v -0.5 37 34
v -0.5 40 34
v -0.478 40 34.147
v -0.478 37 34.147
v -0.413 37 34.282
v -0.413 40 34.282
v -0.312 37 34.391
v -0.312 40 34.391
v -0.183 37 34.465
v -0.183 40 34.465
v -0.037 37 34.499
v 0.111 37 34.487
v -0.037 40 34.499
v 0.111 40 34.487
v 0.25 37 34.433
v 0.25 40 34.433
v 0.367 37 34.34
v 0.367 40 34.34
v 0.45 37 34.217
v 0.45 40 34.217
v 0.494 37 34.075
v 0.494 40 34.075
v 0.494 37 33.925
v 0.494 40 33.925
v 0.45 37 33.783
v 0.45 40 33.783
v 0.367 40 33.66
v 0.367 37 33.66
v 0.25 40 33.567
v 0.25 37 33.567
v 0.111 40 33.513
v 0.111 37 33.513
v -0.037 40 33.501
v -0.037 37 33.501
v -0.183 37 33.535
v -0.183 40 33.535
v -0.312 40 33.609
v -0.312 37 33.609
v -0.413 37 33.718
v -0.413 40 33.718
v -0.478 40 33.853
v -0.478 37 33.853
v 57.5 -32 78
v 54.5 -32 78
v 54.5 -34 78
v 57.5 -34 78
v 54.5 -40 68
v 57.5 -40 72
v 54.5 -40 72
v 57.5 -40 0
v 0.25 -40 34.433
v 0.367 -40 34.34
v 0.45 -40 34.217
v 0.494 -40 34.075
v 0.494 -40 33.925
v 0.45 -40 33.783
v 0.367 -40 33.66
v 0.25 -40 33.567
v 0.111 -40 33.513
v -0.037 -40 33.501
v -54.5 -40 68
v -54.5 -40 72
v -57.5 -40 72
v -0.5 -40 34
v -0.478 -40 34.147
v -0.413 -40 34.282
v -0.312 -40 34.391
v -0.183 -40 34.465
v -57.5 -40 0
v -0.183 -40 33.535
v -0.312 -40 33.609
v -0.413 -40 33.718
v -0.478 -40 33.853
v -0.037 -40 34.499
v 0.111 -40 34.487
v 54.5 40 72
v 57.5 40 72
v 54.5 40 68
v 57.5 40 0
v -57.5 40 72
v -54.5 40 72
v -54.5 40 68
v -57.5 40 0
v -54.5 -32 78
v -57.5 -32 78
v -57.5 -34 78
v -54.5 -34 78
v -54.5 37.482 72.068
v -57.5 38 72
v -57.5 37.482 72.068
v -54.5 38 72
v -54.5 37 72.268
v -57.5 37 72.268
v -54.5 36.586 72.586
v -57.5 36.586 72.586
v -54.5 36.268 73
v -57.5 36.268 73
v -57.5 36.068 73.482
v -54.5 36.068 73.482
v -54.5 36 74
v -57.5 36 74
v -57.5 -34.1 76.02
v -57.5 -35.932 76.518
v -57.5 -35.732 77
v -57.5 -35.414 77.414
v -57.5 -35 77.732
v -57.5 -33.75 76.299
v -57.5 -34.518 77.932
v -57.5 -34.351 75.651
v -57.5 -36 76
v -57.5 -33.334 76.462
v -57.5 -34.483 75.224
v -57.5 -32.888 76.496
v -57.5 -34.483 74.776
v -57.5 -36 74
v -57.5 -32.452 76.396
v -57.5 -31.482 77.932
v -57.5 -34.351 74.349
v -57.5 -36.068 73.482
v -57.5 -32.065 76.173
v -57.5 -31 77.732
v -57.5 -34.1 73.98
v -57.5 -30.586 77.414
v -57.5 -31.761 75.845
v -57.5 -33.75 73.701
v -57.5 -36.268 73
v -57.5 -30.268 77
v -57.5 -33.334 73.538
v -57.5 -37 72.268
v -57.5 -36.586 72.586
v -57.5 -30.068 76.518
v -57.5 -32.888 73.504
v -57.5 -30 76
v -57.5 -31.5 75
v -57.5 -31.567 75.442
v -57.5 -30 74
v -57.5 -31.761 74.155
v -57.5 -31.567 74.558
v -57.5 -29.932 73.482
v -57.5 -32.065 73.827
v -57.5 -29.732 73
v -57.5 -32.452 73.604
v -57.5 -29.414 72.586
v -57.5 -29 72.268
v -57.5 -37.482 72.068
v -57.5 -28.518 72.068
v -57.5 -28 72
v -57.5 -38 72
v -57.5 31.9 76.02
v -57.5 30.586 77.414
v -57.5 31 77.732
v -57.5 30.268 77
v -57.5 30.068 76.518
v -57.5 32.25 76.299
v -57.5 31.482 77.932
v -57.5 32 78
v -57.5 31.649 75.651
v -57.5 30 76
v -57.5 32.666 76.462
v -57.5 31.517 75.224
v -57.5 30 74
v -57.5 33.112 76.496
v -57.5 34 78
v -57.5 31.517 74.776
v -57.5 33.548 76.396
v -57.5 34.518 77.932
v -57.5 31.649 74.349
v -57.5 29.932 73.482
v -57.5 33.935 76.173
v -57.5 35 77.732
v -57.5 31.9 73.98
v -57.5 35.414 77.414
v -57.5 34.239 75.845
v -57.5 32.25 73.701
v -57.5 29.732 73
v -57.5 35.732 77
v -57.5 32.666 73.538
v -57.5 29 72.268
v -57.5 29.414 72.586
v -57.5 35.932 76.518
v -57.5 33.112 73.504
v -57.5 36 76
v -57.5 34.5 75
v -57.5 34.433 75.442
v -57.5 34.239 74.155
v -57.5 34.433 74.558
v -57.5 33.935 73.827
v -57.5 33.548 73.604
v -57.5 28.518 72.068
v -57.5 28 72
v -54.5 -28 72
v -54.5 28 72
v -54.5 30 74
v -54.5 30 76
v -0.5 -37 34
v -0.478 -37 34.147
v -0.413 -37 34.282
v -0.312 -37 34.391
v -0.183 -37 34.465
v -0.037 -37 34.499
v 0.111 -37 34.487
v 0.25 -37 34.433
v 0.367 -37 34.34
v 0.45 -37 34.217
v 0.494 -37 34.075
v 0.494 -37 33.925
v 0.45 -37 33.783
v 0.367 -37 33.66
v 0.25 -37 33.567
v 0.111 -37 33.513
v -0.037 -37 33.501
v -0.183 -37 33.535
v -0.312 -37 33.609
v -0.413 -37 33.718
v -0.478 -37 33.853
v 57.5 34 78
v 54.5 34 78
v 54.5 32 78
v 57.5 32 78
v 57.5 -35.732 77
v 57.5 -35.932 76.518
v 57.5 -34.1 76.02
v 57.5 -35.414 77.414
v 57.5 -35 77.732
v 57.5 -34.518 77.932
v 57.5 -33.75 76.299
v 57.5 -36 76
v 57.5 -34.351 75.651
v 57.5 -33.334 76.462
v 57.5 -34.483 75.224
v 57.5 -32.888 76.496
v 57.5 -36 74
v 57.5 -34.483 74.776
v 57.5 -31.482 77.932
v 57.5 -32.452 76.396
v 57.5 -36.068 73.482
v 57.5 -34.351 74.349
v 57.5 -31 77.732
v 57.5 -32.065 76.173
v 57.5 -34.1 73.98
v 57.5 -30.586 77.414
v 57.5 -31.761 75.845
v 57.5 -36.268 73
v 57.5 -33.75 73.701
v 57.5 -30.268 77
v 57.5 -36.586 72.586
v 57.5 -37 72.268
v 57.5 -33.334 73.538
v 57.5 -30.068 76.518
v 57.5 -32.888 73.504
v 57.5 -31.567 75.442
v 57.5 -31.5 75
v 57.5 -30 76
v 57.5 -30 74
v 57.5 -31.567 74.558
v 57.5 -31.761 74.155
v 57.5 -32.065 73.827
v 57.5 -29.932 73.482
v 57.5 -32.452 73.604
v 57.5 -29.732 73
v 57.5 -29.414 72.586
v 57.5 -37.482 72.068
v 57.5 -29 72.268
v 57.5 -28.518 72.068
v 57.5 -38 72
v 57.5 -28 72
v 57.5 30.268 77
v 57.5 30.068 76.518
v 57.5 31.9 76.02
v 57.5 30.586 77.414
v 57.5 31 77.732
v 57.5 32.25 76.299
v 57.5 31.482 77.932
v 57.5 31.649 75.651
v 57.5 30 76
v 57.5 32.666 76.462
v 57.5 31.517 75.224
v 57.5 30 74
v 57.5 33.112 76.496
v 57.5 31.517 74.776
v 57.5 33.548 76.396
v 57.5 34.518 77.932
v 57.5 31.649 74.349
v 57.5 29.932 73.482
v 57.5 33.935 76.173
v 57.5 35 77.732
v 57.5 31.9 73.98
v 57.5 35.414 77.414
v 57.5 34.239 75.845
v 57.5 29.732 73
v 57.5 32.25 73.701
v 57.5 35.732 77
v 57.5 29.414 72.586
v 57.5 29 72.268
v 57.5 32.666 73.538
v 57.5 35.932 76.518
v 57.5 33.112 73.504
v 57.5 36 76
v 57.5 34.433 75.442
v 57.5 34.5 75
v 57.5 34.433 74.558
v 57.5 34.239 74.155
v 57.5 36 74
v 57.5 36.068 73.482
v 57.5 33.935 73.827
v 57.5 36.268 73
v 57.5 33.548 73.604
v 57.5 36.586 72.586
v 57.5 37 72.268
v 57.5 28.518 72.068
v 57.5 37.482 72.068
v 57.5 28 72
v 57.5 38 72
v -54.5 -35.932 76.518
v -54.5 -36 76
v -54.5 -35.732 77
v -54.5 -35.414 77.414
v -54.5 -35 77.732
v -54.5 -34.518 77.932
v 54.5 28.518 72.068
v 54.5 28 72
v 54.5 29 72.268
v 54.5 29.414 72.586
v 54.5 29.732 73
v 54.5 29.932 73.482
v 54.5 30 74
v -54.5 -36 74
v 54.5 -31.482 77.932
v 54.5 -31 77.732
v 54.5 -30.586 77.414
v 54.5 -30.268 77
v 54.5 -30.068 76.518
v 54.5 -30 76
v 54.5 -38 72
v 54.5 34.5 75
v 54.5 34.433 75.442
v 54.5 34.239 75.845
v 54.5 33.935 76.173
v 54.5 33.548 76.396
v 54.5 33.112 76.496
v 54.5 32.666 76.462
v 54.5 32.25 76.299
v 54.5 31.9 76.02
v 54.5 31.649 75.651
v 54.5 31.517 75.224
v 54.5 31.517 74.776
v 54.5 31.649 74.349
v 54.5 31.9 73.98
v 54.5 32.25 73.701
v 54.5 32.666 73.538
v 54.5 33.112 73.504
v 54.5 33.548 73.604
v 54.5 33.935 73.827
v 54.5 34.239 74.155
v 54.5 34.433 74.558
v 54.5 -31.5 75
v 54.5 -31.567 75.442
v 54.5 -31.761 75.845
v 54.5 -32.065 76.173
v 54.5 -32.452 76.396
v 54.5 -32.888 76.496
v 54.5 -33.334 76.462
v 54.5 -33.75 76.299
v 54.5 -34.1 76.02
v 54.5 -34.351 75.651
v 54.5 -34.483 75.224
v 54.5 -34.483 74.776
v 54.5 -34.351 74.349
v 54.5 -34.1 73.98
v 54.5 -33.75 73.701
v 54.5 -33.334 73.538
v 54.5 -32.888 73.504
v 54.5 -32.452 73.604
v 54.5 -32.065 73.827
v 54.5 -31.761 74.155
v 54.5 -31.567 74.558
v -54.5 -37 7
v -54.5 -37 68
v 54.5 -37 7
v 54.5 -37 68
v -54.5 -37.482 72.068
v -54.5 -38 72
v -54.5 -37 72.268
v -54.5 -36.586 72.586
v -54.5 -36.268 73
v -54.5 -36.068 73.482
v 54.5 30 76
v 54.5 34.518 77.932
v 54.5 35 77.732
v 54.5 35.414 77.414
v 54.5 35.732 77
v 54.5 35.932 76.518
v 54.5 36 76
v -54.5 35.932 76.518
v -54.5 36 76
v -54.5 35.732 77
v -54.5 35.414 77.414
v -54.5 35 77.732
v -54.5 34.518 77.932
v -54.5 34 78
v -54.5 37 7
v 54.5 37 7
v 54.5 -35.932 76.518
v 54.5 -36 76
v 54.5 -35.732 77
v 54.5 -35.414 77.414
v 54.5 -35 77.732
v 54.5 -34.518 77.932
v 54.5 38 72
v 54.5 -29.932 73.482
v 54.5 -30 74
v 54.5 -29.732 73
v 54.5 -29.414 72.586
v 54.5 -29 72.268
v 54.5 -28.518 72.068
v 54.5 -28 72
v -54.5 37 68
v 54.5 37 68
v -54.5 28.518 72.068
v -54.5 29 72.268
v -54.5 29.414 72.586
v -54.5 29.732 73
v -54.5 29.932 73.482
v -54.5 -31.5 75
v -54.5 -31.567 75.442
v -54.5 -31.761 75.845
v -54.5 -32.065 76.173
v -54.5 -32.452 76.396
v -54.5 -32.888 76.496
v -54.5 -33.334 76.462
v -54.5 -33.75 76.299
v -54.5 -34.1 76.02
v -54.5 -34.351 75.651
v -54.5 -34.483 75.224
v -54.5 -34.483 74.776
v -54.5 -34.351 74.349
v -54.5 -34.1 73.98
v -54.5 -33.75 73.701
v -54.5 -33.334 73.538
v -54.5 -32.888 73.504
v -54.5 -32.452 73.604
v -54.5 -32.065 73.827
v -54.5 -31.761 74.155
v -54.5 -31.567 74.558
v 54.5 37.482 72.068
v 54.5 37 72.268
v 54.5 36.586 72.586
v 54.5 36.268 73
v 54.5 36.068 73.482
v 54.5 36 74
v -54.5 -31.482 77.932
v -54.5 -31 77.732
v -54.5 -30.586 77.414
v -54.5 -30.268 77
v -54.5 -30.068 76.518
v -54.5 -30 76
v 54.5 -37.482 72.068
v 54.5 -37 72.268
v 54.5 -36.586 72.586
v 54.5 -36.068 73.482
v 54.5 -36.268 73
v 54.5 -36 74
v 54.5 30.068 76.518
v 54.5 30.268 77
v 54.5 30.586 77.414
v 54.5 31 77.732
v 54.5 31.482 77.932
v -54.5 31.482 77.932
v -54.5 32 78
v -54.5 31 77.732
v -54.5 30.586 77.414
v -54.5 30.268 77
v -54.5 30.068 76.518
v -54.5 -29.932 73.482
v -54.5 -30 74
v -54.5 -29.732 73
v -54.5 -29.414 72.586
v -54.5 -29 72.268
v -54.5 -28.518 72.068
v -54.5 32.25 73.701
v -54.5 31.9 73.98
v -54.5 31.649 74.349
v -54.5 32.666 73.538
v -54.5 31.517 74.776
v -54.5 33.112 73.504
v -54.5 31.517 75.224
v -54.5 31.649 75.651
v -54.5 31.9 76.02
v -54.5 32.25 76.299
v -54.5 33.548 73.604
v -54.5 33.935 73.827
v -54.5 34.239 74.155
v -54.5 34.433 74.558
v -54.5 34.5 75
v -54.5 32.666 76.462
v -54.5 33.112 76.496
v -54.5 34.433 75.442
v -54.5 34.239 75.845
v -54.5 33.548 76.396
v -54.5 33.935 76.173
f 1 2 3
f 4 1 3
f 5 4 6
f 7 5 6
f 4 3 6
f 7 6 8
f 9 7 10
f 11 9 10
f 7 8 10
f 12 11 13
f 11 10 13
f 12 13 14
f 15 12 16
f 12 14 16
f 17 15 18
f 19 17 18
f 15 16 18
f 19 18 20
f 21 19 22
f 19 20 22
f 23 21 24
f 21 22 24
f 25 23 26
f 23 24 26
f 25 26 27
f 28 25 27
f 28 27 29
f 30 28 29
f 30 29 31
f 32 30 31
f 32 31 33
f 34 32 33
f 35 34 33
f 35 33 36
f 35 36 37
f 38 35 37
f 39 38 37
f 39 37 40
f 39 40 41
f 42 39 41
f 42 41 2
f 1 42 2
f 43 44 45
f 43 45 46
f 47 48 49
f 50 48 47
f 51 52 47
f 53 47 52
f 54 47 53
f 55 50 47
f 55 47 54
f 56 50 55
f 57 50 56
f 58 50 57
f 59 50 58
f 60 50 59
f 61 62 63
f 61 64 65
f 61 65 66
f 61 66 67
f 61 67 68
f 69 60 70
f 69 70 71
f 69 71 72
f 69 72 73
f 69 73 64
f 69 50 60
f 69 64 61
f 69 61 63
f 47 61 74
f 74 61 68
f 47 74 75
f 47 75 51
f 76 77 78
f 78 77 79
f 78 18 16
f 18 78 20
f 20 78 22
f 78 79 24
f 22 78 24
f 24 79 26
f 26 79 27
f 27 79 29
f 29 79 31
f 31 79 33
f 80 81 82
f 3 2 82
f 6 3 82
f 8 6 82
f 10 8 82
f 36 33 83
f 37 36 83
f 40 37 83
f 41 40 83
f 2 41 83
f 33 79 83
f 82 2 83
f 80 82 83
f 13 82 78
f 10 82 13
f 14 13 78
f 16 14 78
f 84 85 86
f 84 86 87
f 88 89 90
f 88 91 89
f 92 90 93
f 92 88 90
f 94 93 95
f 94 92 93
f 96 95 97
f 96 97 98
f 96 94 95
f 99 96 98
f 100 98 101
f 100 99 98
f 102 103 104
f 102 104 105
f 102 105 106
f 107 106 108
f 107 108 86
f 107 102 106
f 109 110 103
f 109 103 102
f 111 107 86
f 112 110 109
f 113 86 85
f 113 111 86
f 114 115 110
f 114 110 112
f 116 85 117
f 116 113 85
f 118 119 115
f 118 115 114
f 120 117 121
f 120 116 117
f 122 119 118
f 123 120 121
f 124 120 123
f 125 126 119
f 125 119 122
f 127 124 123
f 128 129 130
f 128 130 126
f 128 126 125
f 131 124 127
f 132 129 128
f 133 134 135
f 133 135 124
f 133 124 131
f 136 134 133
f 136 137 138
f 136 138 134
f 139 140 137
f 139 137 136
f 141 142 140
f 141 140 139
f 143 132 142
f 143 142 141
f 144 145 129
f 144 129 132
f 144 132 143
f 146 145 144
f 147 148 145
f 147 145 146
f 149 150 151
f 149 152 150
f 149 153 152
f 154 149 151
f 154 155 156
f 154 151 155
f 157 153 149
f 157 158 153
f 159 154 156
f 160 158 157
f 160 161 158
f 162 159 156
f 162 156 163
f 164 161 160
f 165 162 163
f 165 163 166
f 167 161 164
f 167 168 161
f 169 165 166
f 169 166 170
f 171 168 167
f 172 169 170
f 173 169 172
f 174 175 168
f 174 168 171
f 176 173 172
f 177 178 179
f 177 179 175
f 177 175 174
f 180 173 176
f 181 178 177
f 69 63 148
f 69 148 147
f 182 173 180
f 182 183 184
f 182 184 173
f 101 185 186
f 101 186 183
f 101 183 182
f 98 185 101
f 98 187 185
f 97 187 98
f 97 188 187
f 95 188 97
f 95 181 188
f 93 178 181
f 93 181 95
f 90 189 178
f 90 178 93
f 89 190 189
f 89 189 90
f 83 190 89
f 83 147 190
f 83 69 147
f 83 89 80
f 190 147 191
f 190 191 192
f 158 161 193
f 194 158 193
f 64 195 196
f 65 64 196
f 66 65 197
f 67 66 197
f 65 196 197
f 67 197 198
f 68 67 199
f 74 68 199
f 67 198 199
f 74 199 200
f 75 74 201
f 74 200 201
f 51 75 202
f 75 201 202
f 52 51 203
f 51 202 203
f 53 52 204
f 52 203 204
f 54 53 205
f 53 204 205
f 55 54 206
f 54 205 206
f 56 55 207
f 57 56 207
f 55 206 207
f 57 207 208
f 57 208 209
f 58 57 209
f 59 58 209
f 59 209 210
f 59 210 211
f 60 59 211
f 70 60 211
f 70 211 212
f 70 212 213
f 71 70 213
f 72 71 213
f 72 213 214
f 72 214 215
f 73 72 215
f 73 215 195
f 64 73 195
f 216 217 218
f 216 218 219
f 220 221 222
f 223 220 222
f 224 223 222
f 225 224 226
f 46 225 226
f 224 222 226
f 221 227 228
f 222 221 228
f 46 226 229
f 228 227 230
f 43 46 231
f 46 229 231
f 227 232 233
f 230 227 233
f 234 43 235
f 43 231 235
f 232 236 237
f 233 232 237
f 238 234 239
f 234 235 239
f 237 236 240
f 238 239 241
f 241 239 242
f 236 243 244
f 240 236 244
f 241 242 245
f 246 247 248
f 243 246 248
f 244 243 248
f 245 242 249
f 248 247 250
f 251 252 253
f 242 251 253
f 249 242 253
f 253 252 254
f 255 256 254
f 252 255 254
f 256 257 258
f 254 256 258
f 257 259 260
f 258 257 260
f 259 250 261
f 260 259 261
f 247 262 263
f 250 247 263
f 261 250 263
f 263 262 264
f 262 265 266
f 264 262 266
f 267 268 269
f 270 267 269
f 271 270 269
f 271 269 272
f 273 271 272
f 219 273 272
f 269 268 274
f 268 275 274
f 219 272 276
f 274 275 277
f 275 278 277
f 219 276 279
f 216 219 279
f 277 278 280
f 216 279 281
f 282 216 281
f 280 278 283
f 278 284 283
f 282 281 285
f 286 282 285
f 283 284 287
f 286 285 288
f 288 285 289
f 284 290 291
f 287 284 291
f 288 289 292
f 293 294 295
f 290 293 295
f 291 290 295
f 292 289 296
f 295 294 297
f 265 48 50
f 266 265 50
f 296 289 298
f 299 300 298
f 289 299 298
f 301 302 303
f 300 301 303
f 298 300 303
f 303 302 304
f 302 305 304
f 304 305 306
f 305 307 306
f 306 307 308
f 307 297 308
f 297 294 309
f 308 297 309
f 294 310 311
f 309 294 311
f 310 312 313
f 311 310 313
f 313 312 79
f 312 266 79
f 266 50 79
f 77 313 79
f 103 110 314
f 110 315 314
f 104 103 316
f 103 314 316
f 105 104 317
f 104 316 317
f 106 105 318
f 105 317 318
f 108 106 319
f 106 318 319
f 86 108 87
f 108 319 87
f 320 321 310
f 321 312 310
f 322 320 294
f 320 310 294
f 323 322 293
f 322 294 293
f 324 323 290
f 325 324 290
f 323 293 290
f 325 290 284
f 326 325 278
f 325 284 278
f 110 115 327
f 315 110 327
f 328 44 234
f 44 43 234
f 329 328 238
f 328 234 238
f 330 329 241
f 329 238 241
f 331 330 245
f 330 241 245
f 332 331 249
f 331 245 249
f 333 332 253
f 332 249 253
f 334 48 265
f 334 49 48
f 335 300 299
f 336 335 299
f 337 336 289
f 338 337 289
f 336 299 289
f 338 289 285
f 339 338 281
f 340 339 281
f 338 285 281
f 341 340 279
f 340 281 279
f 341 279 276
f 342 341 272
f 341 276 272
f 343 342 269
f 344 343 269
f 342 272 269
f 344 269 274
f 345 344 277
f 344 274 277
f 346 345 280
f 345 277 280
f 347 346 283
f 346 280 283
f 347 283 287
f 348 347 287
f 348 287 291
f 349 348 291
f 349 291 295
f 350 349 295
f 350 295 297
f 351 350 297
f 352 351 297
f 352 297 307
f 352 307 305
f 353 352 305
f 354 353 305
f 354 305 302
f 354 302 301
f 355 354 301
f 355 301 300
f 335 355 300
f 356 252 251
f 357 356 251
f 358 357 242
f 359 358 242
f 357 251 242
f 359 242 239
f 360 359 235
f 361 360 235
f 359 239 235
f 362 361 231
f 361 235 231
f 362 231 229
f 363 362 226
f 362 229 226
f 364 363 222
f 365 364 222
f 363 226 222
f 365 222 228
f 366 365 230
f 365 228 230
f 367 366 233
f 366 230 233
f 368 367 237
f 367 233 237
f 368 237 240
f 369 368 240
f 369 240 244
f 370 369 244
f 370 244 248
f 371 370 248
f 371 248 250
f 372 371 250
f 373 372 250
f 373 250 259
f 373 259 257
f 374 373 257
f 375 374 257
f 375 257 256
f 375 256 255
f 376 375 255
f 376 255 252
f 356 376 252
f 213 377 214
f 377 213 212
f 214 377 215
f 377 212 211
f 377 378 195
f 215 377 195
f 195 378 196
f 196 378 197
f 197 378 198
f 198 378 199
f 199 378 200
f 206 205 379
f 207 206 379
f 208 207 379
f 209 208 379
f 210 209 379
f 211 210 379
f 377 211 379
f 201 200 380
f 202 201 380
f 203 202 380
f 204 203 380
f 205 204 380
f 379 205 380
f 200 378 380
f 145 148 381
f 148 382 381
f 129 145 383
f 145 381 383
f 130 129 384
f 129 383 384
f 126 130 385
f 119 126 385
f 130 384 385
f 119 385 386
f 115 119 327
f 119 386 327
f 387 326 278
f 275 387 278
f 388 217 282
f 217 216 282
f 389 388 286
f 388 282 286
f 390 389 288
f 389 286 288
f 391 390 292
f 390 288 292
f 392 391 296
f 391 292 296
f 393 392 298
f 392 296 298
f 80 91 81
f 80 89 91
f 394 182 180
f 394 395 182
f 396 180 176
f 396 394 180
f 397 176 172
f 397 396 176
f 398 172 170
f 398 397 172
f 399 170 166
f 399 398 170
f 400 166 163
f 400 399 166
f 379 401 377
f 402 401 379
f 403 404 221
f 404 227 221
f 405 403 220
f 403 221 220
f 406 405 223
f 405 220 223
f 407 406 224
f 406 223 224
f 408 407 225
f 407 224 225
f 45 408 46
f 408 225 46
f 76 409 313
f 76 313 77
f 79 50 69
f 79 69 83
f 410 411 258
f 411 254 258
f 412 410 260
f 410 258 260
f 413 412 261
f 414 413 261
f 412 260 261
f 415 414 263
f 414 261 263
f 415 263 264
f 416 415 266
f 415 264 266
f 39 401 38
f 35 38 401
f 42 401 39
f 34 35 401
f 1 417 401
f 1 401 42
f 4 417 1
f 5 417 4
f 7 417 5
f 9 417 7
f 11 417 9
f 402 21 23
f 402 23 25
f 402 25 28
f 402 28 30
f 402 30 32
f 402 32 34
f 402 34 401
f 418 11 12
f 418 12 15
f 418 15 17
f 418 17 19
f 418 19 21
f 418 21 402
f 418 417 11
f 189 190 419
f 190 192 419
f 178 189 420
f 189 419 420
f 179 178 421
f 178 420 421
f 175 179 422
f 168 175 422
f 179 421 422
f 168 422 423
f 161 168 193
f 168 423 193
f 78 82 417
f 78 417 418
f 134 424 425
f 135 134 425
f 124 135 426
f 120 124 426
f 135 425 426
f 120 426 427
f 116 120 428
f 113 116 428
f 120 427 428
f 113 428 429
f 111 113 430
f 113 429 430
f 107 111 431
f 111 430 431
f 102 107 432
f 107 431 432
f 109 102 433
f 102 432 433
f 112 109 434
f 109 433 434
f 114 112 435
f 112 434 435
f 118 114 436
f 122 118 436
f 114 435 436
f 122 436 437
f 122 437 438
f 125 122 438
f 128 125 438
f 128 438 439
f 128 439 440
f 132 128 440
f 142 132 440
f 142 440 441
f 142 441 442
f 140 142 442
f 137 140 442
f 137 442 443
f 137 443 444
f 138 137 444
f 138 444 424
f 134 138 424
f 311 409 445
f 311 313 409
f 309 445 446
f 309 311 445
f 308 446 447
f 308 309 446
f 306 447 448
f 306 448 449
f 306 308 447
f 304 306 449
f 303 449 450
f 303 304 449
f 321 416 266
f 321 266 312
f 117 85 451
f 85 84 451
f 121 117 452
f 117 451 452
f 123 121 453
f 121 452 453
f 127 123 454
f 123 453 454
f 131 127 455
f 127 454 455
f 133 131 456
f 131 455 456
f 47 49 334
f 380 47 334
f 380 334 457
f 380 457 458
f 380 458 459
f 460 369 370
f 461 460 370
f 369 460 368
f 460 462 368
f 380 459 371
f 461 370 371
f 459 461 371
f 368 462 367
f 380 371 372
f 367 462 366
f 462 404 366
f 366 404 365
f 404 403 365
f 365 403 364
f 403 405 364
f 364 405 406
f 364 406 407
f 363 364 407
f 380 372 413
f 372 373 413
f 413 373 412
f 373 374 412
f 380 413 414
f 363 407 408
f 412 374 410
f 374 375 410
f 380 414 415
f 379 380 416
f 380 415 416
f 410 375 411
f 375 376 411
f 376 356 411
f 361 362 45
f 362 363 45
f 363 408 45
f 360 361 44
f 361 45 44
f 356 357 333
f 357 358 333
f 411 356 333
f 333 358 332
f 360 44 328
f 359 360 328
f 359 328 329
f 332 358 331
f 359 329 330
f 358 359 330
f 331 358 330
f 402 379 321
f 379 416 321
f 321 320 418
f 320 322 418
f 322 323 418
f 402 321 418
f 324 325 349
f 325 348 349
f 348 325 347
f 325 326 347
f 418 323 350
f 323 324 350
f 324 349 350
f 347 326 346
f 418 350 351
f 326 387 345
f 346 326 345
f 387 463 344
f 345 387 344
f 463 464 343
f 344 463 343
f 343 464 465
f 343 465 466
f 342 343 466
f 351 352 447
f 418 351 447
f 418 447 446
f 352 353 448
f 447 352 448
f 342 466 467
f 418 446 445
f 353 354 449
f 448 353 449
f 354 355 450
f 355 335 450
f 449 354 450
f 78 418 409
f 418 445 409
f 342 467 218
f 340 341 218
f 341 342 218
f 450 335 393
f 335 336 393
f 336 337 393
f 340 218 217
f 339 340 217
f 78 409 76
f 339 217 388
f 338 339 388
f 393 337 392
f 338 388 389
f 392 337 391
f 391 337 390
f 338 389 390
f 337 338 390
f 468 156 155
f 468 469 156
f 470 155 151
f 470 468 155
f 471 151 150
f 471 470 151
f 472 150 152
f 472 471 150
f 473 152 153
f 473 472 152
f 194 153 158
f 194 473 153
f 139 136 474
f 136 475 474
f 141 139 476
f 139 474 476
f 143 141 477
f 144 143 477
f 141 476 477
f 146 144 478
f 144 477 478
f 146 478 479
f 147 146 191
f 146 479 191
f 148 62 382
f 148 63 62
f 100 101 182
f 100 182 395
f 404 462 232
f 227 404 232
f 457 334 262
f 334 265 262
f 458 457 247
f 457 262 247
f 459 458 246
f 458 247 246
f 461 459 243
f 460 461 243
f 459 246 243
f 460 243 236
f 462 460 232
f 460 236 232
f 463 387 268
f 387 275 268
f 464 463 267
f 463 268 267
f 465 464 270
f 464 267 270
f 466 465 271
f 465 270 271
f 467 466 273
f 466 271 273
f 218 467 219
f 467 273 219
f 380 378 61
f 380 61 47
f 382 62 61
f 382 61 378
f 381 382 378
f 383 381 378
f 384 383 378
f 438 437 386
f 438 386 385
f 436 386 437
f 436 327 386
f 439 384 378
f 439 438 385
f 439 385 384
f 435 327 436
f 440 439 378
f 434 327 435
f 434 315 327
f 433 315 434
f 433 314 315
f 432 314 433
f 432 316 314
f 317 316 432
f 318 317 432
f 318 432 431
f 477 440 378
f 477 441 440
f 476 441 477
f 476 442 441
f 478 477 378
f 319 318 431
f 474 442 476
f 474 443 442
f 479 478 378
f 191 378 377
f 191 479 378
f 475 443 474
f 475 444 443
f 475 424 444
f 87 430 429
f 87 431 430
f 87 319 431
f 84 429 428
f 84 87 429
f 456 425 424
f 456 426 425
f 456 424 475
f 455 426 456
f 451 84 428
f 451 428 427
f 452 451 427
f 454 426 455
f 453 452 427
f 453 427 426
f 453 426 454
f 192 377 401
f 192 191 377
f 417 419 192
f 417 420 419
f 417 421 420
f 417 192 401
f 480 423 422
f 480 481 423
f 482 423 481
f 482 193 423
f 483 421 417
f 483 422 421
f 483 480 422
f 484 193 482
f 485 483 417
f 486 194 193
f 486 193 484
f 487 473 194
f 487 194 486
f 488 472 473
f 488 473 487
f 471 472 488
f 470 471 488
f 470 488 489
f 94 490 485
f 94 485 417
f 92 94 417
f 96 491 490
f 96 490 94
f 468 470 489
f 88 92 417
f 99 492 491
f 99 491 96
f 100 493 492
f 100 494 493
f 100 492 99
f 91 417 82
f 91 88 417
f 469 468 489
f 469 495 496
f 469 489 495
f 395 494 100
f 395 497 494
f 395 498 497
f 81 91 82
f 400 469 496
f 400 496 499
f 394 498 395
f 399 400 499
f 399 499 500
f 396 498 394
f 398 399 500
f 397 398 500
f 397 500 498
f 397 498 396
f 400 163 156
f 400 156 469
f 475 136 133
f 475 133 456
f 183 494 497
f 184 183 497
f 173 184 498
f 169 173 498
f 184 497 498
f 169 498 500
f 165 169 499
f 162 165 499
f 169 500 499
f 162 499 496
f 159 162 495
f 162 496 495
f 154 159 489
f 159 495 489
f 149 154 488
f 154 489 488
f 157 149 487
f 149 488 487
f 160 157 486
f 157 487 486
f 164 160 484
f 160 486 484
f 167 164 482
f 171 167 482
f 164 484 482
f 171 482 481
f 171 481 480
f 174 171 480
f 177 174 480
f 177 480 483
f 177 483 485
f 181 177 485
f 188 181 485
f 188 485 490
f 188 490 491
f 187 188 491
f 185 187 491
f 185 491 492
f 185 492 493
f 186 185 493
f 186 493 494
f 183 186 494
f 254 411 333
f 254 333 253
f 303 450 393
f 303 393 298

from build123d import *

# Parameters (mm, degrees)
SKETCH1_W               = 80
SKETCH1_H               = 115
BOSS_EXTRUDE1_DEPTH     = 72
SKETCH3_W               = 109
SKETCH3_H               = 74
CUT_EXTRUDE1_DEPTH      = 1
CUT_EXTRUDE1_DEPTH_BACK = 65
SKETCH4_W               = 3
SKETCH4_H               = 6
BOSS_EXTRUDE2_DEPTH     = 6
SKETCH5_W               = 109
SKETCH5_H               = 3
CUT_EXTRUDE2_DEPTH      = 4
SKETCH6_R               = 1.5
CUT_EXTRUDE3_DEPTH      = 1
CUT_EXTRUDE3_DEPTH_BACK = 116
FILLET1_R               = 2
SKETCH7_R               = 0.5
CUT_EXTRUDE4_DEPTH      = 1
CUT_EXTRUDE4_DEPTH_BACK = 81


with BuildPart() as part:
    # Sketch1 → Boss-Extrude1 (new body)
    with BuildSketch(Plane(origin=(0, 0, 0), x_dir=(0, 1, 0), z_dir=(0, 0, 1))):
        Rectangle(SKETCH1_W, SKETCH1_H)
    extrude(amount=BOSS_EXTRUDE1_DEPTH)

    # Sketch3 → Cut-Extrude1 (cut, two sides)
    with BuildSketch(Plane.XY.offset(72)) as cut_extrude1_sk:
        Rectangle(SKETCH3_W, SKETCH3_H)
    extrude(amount=CUT_EXTRUDE1_DEPTH, mode=Mode.SUBTRACT)
    extrude(cut_extrude1_sk.sketch, amount=-CUT_EXTRUDE1_DEPTH_BACK, mode=Mode.SUBTRACT)

    # Sketch4 → Boss-Extrude2 (add)
    with BuildSketch(Plane.XY.offset(72)):
        with Locations((-56, 33)):
            Rectangle(SKETCH4_W, SKETCH4_H)
        with Locations((-56, -33)):
            Rectangle(SKETCH4_W, SKETCH4_H)
        with Locations((56, -33)):
            Rectangle(SKETCH4_W, SKETCH4_H)
        with Locations((56, 33)):
            Rectangle(SKETCH4_W, SKETCH4_H)
    extrude(amount=BOSS_EXTRUDE2_DEPTH)

    # Sketch5 → Cut-Extrude2 (cut)
    with BuildSketch(Plane.XY.offset(72)):
        with Locations((0, 38.5)):
            Rectangle(SKETCH5_W, SKETCH5_H)
        with Locations((0, -38.5)):
            Rectangle(SKETCH5_W, SKETCH5_H)
    extrude(amount=-CUT_EXTRUDE2_DEPTH, mode=Mode.SUBTRACT)

    # Sketch6 → Cut-Extrude3 (cut, two sides)
    with BuildSketch(Plane.YZ.offset(57.5)) as cut_extrude3_sk:
        with Locations((-33, 75)):
            Circle(SKETCH6_R)
        with Locations((33, 75)):
            Circle(SKETCH6_R)
    extrude(amount=CUT_EXTRUDE3_DEPTH, mode=Mode.SUBTRACT)
    extrude(cut_extrude3_sk.sketch, amount=-CUT_EXTRUDE3_DEPTH_BACK, mode=Mode.SUBTRACT)

    # Fillet1
    fillet1_edges = [part.edges().sort_by_distance(p)[0] for p in [
        (56, 30, 72),
        (56, 36, 72),
        (56, 30, 78),
        (56, 36, 78),
        (56, -36, 72),
        (56, -30, 72),
        (56, -36, 78),
        (56, -30, 78),
        (-56, -30, 72),
        (-56, -36, 72),
        (-56, -30, 78),
        (-56, -36, 78),
        (-56, 36, 72),
        (-56, 30, 72),
        (-56, 36, 78),
        (-56, 30, 78),
    ]]
    fillet(fillet1_edges, radius=FILLET1_R)

    # Sketch7 → Cut-Extrude4 (cut, two sides)
    with BuildSketch(Plane(origin=(0, 40, 0), x_dir=(-1, 0, 0), z_dir=(0, 1, 0))) as cut_extrude4_sk:
        with Locations((0, 34)):
            Circle(SKETCH7_R)
    extrude(amount=CUT_EXTRUDE4_DEPTH, mode=Mode.SUBTRACT)
    extrude(cut_extrude4_sk.sketch, amount=-CUT_EXTRUDE4_DEPTH_BACK, mode=Mode.SUBTRACT)


solid = part.part
